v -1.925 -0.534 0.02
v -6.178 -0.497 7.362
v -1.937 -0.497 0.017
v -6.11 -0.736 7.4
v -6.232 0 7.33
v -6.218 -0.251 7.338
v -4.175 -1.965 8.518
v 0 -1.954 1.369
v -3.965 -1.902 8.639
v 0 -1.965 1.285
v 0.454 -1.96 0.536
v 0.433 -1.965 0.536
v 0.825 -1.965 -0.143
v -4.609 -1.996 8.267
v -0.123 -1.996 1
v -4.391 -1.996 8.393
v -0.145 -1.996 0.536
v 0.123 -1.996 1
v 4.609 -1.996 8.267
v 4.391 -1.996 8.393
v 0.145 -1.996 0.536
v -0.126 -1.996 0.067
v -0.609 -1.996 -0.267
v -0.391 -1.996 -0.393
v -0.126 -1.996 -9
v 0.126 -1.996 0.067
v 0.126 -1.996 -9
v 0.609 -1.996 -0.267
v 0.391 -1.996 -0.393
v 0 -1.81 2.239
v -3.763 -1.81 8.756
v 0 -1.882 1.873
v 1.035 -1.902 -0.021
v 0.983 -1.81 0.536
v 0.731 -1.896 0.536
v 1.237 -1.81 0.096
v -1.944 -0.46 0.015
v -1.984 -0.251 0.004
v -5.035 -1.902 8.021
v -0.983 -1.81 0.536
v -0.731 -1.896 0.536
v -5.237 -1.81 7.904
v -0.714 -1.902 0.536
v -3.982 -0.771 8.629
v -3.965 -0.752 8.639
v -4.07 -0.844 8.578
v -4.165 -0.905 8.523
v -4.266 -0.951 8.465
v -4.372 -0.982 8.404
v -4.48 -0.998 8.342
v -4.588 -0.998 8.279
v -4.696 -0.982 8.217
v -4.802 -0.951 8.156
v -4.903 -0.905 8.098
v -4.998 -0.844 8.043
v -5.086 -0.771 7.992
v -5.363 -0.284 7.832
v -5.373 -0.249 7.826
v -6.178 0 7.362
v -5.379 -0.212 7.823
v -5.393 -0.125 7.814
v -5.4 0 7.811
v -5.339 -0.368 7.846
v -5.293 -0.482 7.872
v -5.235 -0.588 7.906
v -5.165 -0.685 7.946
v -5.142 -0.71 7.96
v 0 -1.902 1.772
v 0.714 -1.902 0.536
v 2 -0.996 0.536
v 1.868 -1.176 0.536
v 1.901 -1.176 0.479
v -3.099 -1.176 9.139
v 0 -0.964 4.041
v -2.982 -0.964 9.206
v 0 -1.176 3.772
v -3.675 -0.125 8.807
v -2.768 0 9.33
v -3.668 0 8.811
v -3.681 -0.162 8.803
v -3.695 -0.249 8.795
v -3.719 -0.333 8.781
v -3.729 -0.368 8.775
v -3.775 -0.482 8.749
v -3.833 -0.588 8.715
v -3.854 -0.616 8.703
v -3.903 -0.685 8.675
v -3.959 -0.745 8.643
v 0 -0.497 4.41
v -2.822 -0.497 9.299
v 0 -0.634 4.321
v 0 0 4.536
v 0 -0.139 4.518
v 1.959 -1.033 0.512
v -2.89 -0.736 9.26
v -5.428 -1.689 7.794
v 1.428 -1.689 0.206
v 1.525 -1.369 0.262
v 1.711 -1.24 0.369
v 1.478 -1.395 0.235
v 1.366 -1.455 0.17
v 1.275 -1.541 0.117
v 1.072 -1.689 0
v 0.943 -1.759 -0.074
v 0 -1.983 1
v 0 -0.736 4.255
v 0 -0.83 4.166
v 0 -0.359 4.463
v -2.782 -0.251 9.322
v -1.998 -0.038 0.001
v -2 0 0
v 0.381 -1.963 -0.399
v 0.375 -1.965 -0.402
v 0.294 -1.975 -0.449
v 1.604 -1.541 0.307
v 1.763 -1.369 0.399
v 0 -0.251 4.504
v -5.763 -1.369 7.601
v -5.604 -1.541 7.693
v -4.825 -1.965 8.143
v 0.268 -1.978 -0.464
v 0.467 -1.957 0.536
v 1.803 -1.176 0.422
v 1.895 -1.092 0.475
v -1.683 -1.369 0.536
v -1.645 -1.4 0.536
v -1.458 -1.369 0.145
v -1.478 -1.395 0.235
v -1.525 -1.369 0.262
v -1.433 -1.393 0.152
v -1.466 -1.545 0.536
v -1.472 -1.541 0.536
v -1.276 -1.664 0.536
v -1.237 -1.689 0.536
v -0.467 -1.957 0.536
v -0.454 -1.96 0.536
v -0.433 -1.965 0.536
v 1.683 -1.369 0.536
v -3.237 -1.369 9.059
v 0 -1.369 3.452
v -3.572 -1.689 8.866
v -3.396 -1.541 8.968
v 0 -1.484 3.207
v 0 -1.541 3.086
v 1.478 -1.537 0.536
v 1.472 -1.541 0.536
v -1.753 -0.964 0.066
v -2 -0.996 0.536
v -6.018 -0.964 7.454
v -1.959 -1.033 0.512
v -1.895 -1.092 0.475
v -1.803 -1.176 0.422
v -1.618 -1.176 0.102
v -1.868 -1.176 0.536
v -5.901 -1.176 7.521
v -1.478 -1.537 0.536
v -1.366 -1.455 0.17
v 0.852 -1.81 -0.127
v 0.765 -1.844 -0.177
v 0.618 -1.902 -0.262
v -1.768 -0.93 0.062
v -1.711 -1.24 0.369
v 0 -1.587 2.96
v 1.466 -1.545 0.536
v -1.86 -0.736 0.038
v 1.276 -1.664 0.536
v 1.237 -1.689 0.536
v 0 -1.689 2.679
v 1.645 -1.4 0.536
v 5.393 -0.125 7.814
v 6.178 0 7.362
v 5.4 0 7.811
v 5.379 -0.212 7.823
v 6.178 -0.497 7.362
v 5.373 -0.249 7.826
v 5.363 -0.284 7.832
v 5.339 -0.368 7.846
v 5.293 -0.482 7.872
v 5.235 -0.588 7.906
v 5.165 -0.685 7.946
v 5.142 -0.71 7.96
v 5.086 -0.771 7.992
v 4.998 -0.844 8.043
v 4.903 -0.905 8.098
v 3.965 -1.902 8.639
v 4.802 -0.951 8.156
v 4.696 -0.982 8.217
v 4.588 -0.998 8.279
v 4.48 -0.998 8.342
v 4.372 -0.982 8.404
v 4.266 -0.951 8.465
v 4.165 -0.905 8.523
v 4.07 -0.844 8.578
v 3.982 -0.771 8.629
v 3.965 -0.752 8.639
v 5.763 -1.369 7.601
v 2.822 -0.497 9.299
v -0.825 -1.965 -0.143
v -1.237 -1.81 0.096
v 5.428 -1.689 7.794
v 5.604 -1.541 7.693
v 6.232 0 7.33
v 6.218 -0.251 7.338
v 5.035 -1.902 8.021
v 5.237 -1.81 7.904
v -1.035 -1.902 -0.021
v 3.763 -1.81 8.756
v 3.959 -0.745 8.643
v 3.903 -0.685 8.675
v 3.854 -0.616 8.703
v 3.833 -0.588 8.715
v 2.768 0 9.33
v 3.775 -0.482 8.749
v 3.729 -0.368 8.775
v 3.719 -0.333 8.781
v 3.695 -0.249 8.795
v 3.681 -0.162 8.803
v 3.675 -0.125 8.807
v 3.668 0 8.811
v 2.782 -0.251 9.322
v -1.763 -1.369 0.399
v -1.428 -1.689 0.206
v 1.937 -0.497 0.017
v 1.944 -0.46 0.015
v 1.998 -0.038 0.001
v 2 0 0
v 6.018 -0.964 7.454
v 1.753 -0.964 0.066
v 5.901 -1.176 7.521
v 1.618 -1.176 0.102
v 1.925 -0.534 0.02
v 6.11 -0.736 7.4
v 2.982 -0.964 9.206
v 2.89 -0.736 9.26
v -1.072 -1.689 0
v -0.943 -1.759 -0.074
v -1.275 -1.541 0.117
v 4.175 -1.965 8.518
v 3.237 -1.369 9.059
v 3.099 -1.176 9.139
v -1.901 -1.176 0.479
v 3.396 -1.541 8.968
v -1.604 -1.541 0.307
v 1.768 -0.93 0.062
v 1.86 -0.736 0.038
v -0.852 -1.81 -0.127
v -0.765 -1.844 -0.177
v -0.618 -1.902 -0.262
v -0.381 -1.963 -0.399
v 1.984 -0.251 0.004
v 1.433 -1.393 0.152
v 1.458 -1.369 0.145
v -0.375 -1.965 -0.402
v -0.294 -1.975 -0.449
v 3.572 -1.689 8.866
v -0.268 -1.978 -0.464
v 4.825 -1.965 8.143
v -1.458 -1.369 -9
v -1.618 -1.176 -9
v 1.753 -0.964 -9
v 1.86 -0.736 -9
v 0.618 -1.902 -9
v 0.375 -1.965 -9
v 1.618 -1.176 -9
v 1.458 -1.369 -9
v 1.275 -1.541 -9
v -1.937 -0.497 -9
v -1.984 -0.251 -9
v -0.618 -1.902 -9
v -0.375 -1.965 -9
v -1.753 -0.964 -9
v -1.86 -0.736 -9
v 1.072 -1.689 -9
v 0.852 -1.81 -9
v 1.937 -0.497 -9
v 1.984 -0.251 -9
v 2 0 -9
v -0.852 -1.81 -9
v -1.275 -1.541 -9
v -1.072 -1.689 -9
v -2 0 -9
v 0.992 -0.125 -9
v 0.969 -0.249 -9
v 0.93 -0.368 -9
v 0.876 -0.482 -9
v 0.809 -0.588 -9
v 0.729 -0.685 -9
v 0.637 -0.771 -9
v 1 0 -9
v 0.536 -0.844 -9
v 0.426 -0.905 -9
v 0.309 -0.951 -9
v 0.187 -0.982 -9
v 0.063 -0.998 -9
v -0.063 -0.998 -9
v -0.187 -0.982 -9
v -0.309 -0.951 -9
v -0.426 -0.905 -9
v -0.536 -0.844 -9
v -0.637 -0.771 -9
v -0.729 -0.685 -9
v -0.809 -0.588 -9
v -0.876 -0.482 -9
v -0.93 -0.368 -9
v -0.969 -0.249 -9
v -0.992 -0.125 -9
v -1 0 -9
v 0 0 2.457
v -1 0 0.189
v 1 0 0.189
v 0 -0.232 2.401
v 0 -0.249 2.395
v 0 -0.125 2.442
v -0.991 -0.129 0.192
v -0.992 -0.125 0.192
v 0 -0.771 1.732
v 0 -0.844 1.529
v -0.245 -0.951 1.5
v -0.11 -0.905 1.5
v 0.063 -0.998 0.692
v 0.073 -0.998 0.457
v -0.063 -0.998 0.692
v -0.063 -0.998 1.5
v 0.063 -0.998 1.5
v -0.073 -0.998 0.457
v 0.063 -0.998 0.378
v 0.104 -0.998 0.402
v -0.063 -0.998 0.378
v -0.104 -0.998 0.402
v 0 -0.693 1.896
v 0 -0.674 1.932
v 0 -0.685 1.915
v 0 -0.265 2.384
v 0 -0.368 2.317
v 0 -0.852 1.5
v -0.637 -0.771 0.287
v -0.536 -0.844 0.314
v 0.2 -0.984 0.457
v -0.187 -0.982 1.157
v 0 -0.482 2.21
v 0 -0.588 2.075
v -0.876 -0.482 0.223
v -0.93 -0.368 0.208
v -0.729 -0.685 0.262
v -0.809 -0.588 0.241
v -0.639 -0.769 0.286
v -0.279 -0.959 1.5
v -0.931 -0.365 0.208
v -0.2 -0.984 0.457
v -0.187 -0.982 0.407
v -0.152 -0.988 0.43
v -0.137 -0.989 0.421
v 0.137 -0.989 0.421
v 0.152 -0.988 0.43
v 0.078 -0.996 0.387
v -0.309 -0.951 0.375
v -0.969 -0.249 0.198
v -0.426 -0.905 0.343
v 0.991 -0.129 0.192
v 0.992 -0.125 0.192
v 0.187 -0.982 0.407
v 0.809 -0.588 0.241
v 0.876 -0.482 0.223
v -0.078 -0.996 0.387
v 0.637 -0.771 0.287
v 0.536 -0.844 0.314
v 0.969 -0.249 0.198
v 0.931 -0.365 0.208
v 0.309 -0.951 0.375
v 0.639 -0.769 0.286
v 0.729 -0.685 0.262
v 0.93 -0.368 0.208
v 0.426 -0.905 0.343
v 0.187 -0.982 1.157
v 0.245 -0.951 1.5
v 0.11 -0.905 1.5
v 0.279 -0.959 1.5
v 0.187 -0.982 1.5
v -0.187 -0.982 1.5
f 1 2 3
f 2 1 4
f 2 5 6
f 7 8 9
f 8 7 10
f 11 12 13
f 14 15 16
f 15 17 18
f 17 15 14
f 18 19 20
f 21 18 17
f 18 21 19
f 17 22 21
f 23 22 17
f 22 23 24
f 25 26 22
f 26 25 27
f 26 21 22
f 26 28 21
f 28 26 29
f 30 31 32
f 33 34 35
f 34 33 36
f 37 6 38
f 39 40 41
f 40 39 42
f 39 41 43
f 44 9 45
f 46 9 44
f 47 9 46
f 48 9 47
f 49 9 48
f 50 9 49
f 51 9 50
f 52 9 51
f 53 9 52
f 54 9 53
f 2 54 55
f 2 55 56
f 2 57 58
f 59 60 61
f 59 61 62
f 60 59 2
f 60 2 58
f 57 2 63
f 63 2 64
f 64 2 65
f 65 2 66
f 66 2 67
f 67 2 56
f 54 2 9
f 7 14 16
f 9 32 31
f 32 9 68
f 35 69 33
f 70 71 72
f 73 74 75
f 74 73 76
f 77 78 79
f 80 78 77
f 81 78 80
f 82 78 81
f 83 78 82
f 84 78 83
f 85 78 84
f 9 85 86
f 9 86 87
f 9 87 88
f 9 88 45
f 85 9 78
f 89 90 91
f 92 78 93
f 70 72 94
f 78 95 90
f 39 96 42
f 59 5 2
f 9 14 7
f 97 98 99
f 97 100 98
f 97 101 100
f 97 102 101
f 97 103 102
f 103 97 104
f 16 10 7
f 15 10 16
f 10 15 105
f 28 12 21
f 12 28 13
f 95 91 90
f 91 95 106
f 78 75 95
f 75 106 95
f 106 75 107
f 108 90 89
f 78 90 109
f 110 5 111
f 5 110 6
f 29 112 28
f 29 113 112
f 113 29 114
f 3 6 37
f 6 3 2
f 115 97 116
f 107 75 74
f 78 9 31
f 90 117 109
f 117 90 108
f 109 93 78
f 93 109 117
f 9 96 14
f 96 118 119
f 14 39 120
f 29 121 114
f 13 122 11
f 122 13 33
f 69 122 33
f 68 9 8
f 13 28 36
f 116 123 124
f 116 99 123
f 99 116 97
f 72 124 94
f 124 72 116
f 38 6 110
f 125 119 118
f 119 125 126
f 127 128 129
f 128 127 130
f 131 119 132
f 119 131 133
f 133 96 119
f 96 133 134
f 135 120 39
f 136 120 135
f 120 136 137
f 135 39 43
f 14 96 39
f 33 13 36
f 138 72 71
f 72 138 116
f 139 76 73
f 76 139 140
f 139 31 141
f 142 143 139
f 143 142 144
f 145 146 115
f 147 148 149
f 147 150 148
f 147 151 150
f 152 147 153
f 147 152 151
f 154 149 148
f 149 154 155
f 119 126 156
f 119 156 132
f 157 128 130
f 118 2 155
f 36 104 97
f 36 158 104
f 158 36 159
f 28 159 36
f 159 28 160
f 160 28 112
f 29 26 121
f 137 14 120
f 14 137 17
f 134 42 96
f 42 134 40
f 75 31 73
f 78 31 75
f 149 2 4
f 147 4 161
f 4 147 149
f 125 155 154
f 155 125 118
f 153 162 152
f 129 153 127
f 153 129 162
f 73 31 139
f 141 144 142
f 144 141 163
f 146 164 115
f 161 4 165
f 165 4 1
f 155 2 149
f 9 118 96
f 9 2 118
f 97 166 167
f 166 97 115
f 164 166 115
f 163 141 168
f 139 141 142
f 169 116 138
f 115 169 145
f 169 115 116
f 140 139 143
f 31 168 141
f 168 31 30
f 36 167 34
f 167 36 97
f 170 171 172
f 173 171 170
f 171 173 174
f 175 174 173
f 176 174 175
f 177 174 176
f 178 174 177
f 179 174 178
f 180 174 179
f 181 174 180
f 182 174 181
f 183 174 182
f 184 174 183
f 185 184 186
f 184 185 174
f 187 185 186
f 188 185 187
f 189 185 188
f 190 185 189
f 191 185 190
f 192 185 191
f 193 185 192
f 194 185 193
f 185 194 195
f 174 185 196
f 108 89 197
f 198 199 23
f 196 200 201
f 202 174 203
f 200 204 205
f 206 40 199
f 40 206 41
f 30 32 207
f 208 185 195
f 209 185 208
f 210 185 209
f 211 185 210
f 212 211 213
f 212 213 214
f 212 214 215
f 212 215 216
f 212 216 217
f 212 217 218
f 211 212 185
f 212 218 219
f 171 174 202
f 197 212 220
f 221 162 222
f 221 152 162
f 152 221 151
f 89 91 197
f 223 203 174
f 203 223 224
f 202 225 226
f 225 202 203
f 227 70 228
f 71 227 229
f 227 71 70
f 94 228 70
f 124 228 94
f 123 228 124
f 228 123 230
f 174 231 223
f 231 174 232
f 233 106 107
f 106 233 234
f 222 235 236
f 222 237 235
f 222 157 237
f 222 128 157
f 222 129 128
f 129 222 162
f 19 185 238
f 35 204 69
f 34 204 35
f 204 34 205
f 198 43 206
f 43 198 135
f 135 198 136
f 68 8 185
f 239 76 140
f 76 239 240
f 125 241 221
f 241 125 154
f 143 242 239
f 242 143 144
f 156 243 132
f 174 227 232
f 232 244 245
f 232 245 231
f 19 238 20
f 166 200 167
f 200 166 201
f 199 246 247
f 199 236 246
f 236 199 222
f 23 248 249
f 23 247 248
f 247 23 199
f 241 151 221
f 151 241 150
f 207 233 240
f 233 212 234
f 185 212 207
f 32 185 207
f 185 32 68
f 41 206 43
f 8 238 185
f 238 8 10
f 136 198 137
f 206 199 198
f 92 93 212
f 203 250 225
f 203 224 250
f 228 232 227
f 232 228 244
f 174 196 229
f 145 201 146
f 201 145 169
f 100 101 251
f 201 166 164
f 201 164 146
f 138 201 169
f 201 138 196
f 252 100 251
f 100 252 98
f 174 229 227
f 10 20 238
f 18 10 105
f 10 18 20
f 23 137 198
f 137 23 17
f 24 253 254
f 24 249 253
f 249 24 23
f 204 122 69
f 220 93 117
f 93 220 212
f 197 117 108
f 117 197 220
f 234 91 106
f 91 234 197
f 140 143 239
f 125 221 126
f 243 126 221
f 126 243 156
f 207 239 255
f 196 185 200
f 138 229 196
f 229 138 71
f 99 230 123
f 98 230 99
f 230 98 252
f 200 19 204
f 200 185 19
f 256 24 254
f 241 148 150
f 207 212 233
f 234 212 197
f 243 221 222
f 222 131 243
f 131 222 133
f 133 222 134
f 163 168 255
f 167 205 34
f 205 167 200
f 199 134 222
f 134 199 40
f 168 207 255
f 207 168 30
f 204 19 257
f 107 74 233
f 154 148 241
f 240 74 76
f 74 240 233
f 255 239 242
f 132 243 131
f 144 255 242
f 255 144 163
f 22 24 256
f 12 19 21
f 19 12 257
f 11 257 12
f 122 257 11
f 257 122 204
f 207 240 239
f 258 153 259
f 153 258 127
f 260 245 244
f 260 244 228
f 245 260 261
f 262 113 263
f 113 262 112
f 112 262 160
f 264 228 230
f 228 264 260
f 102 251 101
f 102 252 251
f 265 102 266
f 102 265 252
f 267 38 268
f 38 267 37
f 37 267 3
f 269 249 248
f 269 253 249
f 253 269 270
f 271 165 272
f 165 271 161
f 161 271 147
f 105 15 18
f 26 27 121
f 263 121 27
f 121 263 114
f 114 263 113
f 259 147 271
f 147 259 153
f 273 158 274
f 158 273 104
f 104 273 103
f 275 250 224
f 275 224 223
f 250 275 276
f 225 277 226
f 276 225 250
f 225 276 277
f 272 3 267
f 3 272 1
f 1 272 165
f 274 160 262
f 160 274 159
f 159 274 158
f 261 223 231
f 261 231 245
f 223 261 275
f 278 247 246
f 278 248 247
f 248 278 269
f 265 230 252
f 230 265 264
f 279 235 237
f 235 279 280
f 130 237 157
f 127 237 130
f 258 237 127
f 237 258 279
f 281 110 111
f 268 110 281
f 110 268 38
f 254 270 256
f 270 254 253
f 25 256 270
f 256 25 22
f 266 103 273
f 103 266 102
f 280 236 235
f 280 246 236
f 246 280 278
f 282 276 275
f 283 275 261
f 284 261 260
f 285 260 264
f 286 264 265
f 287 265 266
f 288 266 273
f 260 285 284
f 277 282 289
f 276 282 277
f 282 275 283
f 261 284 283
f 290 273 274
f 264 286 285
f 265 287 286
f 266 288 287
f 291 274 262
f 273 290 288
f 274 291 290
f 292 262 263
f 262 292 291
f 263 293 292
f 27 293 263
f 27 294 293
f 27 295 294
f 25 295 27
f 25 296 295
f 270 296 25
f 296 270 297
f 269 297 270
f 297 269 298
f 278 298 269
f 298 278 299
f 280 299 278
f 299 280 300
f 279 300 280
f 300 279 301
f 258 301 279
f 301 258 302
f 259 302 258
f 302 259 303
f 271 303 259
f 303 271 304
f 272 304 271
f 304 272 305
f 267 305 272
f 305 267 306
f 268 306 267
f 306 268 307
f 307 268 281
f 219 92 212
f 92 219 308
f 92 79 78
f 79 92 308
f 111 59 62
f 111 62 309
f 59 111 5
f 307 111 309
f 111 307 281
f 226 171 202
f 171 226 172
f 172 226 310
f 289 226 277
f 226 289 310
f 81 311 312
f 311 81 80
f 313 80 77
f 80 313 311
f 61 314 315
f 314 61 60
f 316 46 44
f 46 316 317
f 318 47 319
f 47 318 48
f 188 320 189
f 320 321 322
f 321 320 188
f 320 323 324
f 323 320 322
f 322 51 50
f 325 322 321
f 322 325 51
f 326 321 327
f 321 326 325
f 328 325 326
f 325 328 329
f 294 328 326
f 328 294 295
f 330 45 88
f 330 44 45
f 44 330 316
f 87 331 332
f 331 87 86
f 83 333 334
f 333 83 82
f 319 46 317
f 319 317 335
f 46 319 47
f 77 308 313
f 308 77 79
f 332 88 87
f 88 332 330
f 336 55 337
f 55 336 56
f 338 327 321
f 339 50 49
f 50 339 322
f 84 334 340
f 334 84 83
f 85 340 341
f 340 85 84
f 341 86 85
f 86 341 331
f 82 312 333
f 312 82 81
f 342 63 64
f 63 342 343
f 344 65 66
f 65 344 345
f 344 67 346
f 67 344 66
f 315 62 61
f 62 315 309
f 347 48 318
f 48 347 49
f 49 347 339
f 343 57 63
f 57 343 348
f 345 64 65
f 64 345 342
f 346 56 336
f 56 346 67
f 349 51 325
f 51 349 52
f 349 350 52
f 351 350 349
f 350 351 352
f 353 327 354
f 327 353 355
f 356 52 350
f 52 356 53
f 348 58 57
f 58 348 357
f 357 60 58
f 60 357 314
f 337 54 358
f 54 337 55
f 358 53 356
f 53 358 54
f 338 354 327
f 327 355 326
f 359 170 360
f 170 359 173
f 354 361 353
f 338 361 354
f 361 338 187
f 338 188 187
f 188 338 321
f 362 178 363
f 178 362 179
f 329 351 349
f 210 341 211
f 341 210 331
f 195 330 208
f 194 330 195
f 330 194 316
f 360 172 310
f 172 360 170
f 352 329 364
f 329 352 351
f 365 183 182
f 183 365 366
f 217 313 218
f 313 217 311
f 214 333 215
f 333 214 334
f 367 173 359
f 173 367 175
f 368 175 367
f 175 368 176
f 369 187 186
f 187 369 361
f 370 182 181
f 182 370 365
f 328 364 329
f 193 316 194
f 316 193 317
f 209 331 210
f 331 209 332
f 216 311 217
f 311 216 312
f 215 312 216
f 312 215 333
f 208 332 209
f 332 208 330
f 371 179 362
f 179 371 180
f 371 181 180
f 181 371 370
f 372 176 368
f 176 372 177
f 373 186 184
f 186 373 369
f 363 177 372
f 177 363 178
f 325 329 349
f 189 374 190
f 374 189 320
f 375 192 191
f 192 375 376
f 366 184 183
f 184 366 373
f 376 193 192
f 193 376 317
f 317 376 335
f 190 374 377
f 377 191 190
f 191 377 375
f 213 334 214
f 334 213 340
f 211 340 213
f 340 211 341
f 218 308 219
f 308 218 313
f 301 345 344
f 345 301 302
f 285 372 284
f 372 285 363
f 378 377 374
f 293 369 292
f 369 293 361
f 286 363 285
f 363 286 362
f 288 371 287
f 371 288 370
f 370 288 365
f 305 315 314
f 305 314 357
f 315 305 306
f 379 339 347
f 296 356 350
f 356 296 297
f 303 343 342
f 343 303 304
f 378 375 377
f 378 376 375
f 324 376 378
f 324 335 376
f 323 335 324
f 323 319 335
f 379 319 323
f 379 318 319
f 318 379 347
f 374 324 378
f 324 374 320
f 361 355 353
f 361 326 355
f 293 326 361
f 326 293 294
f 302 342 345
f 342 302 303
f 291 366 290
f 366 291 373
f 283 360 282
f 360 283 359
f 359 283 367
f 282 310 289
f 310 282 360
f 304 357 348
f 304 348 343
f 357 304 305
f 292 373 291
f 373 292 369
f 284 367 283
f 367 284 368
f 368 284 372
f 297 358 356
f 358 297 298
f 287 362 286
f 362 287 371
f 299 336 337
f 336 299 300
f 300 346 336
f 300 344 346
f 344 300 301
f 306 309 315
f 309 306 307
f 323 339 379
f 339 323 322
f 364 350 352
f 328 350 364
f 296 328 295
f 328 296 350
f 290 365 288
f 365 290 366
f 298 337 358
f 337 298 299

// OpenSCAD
$fn = 50;

difference() {
difference() {
    union() {
        translate([-2, 0, 4])
        rotate([0, -30, 0])
        cylinder(h = 10, d = 4, center = true);

        translate([2, 0, 4])
        rotate([0, 30, 0])
        cylinder(h = 10, d = 4, center = true);

        translate([0, 0, -4])
        cylinder(h = 10, d = 4, center = true);
    }

    translate([0, 1, 0])
    cube([20, 2, 20], center = true);
}

translate([-3.2, 0, 6])
rotate([0, -30, 0])
cylinder(h = 13, d = 2,  center = true);

translate([3.2, 0, 6])
rotate([0, 30, 0])
cylinder(h = 13, d = 2,  center = true);

translate([0, 0, -6])
cylinder(15, d = 2, center = true);
}
